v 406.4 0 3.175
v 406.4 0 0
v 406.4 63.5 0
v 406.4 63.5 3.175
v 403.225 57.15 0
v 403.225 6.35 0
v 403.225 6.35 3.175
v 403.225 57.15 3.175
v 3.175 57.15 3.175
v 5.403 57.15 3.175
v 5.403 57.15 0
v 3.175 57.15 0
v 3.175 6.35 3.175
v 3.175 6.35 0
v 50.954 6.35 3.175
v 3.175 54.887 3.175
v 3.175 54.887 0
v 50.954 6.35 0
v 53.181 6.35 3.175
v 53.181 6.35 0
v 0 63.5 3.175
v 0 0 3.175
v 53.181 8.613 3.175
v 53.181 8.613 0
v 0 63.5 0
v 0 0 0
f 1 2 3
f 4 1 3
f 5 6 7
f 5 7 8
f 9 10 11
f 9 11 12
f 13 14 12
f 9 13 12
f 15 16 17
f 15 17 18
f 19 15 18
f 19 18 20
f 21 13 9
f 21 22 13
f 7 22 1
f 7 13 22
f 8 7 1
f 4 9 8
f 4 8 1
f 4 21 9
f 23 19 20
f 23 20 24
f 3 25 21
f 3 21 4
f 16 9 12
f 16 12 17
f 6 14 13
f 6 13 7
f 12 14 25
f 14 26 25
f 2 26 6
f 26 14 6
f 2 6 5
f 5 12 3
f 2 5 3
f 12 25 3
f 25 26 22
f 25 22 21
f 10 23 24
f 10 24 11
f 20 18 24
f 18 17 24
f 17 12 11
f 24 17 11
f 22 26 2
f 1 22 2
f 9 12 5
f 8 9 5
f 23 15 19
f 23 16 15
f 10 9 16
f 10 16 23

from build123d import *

# Parameters (mm, degrees)
F0_W     = 406.4
F0_H     = 63.5
F0_W_2   = 400.05
F0_H_2   = 50.8
F1_DEPTH = 3.175
F3_DEPTH = 3.175


with BuildPart() as f1:
    # F0 (on Top) → F1 (new body)
    with BuildSketch(Plane.XY):
        with Locations((203.2, 31.75)):
            Rectangle(F0_W, F0_H)
        with Locations((203.2, 31.75)):
            Rectangle(F0_W_2, F0_H_2, mode=Mode.SUBTRACT)
    extrude(amount=F1_DEPTH)


with BuildPart() as f3:
    # F2 (on face) → F3 (new body)
    with BuildSketch(Plane.XY.offset(3.175)):
        Polygon((50.953656, 6.35), (53.18125, 6.35), (53.18125, 8.612952), (5.402594, 57.15), (3.175, 57.15), (3.175, 54.887048), align=None)
    extrude(amount=-F3_DEPTH)


solid = Compound([f1.part, f3.part])
